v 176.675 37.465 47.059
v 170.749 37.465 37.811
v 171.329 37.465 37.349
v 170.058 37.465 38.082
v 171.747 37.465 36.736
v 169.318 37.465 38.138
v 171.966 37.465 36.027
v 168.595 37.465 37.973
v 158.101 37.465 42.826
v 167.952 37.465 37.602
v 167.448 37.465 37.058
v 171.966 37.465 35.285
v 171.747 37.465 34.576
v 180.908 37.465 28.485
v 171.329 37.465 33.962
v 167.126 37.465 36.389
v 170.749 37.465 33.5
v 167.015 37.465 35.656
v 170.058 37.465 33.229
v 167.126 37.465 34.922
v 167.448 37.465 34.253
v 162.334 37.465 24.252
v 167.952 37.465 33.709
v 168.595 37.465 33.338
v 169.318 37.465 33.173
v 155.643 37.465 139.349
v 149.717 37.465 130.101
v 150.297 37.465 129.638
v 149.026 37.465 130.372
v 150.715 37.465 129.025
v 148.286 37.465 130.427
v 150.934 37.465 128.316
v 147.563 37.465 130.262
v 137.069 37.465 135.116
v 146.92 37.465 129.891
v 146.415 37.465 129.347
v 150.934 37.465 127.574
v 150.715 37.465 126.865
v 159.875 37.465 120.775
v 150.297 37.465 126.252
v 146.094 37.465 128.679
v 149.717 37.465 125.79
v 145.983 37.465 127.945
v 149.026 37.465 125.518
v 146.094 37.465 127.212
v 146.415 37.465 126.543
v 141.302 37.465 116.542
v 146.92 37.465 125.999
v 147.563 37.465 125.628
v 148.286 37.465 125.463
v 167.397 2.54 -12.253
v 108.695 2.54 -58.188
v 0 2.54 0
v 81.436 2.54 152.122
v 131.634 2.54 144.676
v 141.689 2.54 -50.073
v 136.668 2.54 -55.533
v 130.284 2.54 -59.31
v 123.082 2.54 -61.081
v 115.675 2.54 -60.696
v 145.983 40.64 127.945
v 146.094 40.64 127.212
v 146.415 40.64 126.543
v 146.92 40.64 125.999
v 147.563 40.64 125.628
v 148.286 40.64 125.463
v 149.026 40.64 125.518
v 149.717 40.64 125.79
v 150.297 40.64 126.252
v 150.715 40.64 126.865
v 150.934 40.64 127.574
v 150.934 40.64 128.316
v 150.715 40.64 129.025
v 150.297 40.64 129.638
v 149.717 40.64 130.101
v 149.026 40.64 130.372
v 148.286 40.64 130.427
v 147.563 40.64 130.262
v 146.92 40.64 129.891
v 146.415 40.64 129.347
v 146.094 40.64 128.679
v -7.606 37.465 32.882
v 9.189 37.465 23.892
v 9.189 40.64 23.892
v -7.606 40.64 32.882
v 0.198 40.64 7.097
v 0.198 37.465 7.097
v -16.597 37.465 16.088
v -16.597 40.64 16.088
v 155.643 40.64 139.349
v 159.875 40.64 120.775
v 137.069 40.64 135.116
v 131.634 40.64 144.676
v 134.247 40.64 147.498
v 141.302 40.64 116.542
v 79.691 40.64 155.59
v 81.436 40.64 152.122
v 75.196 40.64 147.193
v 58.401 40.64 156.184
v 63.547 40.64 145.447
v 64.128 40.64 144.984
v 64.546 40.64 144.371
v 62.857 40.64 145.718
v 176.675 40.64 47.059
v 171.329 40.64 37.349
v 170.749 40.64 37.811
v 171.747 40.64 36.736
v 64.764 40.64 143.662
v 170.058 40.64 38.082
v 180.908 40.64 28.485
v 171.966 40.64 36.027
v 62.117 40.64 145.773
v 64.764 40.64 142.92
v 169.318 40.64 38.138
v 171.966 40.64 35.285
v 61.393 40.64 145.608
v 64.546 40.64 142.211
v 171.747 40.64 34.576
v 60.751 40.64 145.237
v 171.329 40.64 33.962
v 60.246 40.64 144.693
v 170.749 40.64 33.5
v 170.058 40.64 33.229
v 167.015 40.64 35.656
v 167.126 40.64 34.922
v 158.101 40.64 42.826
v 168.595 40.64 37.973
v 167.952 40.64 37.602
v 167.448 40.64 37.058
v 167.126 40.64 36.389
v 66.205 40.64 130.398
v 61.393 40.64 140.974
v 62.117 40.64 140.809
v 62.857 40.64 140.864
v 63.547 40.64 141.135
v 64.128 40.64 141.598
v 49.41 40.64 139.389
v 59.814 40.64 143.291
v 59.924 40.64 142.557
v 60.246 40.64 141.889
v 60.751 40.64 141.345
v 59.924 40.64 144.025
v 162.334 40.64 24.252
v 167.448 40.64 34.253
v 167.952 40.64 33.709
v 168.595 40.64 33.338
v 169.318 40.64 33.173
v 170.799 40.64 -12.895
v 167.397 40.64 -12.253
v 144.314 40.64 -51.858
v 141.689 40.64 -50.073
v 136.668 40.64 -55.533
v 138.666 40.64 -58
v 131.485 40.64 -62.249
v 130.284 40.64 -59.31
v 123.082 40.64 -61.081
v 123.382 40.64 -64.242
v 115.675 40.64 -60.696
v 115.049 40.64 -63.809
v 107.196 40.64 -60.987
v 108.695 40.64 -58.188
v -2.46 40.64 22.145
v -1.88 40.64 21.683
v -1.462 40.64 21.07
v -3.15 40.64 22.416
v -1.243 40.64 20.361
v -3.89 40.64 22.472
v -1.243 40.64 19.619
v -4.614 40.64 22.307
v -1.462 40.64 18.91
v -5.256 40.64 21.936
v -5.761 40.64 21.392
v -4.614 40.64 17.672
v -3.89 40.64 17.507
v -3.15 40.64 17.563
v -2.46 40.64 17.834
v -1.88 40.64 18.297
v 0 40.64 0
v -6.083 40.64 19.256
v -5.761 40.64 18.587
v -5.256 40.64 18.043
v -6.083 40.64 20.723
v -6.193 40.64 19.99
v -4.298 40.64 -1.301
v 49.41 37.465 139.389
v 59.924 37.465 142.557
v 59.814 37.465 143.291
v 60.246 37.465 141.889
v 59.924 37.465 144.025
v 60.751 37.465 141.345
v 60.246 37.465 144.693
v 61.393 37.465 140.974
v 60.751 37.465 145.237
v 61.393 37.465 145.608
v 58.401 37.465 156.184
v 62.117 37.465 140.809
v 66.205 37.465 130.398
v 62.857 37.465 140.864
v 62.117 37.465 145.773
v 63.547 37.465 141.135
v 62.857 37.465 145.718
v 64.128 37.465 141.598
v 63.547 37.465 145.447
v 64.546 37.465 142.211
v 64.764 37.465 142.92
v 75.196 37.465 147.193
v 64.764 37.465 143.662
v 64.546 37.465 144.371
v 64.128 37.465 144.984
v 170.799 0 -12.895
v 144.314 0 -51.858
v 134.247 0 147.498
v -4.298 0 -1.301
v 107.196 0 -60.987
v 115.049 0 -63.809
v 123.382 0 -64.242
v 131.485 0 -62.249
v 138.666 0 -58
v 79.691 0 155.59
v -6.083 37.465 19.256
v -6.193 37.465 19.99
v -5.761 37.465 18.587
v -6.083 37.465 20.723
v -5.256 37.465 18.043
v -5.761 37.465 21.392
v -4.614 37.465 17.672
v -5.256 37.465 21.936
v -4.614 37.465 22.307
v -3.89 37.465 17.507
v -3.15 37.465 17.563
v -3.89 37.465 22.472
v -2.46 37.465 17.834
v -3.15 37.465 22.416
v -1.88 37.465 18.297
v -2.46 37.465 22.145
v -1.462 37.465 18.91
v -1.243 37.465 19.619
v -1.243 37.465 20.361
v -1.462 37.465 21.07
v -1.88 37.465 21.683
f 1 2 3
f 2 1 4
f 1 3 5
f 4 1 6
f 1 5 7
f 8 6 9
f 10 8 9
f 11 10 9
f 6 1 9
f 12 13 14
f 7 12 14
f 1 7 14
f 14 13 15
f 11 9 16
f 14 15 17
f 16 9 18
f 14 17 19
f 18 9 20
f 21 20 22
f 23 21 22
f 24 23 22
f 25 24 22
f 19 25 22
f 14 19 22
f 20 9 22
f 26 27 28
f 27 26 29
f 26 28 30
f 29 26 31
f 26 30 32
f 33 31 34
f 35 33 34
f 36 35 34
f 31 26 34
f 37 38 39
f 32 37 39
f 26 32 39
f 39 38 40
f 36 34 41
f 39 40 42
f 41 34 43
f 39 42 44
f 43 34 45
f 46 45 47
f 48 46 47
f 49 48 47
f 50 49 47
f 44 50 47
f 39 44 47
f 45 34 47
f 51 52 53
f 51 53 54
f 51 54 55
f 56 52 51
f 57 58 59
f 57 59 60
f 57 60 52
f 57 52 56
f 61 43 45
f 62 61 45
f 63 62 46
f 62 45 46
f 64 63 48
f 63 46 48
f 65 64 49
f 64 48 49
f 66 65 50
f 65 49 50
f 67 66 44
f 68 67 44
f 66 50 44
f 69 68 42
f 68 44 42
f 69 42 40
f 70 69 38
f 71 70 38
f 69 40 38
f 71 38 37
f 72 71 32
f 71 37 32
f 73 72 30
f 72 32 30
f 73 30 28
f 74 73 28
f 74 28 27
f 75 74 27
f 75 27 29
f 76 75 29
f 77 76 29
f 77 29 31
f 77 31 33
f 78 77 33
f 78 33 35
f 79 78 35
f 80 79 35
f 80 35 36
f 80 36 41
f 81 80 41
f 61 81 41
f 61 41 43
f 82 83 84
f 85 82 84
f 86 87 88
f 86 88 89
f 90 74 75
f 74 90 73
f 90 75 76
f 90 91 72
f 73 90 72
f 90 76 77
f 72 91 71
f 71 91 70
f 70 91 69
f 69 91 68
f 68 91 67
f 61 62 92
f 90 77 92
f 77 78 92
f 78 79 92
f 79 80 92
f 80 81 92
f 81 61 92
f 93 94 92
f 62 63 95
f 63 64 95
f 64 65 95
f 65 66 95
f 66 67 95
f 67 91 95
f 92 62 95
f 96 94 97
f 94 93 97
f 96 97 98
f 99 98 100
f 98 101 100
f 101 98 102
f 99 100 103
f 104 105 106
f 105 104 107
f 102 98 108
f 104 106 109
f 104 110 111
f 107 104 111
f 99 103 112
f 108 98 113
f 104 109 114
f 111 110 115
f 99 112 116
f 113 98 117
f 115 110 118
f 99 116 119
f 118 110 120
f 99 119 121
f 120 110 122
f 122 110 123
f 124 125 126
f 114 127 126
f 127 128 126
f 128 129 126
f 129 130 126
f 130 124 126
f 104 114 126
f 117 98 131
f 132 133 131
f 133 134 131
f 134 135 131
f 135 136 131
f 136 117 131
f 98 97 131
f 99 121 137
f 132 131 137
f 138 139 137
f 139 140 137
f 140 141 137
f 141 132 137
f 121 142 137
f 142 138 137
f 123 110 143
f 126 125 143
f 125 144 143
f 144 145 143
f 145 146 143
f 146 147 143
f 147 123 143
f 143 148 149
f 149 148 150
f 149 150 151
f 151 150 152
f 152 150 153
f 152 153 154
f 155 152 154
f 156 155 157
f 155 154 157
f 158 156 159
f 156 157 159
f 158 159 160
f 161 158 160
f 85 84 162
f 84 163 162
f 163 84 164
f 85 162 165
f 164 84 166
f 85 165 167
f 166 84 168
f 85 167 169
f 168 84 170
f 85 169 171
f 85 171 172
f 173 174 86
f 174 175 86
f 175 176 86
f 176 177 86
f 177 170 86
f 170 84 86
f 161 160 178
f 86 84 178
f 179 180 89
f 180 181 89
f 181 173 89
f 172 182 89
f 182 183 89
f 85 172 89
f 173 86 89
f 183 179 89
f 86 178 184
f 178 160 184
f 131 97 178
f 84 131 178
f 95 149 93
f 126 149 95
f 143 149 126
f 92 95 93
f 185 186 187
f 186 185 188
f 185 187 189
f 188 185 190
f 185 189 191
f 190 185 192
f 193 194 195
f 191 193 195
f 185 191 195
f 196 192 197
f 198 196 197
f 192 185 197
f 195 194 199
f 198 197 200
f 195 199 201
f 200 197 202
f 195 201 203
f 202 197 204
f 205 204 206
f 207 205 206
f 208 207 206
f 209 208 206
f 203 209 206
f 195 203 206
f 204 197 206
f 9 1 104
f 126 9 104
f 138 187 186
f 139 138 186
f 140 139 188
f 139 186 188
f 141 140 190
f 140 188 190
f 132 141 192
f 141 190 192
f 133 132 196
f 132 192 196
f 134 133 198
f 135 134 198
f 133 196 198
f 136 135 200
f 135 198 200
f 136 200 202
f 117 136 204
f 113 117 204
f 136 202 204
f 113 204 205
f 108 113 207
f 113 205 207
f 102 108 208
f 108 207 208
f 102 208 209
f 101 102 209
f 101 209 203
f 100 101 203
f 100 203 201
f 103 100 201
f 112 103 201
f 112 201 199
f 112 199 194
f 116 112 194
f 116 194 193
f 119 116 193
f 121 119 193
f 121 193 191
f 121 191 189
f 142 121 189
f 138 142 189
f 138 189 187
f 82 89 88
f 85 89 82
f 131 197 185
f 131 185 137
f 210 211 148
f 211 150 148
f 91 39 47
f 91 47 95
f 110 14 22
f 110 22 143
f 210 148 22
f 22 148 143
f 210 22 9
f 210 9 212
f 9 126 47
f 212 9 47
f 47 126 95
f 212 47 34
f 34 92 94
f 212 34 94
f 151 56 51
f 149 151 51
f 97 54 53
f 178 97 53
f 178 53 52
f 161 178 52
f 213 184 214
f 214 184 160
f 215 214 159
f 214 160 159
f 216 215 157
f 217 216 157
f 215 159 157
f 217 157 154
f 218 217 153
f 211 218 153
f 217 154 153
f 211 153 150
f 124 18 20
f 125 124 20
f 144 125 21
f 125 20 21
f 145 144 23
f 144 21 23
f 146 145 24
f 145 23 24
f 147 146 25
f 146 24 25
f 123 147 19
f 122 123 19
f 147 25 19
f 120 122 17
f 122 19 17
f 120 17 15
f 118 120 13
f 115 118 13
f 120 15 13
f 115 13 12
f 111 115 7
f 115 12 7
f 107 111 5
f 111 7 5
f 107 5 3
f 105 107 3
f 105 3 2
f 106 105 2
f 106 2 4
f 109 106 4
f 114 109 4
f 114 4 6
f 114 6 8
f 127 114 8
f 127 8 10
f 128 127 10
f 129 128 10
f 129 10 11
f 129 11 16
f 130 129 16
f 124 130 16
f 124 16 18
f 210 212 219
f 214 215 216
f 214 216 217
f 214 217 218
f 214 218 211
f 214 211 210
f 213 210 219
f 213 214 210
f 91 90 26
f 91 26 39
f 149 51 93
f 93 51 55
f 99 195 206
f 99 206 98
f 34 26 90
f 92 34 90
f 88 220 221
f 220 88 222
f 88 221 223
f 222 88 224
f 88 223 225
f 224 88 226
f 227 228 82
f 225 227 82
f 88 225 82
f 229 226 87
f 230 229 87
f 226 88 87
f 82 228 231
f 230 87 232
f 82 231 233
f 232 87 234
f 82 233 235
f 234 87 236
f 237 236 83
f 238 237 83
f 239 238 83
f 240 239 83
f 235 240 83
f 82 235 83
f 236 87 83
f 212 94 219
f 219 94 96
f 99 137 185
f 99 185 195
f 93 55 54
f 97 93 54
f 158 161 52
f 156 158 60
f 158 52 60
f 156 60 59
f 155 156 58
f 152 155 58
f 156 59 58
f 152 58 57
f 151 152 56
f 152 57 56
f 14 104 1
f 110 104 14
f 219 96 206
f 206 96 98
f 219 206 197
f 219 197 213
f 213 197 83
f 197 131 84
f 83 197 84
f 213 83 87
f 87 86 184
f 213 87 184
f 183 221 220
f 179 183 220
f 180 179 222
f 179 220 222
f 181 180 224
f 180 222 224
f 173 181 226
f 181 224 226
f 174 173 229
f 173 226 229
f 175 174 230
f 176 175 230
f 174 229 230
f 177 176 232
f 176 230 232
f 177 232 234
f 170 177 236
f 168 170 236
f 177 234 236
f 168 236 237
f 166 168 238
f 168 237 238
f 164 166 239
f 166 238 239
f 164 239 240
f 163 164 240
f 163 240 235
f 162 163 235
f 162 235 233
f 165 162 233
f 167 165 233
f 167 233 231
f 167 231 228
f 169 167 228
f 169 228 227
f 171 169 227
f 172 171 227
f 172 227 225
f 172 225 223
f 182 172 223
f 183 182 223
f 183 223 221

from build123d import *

# Parameters (mm, degrees)
BOSS_EXTRUDE1_DEPTH      = 2.54
BOSS_EXTRUDE5_DEPTH      = 38.1
BOSS_EXTRUDE5_DEPTH_BACK = 2.54
SKETCH6_W                = 19.05
SKETCH6_H                = 3.175
BOSS_EXTRUDE6_DEPTH      = 19.05
SKETCH7_W                = 19.05
SKETCH7_H                = 3.175
BOSS_EXTRUDE7_DEPTH      = 19.05
CUT_EXTRUDE2_REACH       = 5.175
SKETCH8_R                = 2.4892


with BuildPart() as part:
    # Sketch1 → Boss-Extrude1 (new body)
    with BuildSketch(Plane(origin=(0, 0, 0), x_dir=(1, 0, 0), z_dir=(0, 1, 0))):
        with BuildLine():
            Line((108.694500094, 58.18760289), (0, 0))
            Line((0, 0), (81.435616874, -152.121813345))
            Line((81.435616874, -152.121813345), (131.633654365, -144.676094857))
            Line((131.633654365, -144.676094857), (167.396796738, 12.253350144))
            Line((167.396796738, 12.253350144), (141.688668345, 50.073487268))
            ThreePointArc((141.688668345, 50.073487268), (126.748044303, 60.459528823), (108.694500094, 58.18760289))
        make_face()
    extrude(amount=BOSS_EXTRUDE1_DEPTH)

    # Sketch2 → Boss-Extrude5 (add, two sides)
    with BuildSketch(Plane(origin=(0, 2.54, 0), x_dir=(1, 0, 0), z_dir=(0, 1, 0))) as boss_extrude5_sk:
        with BuildLine():
            Line((79.691089457, -155.590310016), (-4.297615284, 1.300674006))
            Line((-4.297615284, 1.300674006), (107.196029455, 60.986747535))
            ThreePointArc((107.196029455, 60.986747535), (127.50626669, 63.54266421), (144.314468737, 51.85836746))
            Line((144.314468737, 51.85836746), (170.799497483, 12.895304744))
            Line((170.799497483, 12.895304744), (134.24691646, -147.498214188))
            Line((134.24691646, -147.498214188), (79.691089457, -155.590310016))
        make_face()
        with BuildLine():
            Line((81.435616874, -152.121813345), (0, 0))
            Line((0, 0), (108.694500094, 58.18760289))
            ThreePointArc((108.694500094, 58.18760289), (126.748044303, 60.459528823), (141.688668345, 50.073487268))
            Line((141.688668345, 50.073487268), (167.396796738, 12.253350144))
            Line((167.396796738, 12.253350144), (131.633654365, -144.676094857))
            Line((131.633654365, -144.676094857), (81.435616874, -152.121813345))
        make_face(mode=Mode.SUBTRACT)
    extrude(amount=BOSS_EXTRUDE5_DEPTH)
    extrude(boss_extrude5_sk.sketch, amount=-BOSS_EXTRUDE5_DEPTH_BACK)

    # Sketch6 → Boss-Extrude6 (add)
    with BuildSketch(Plane(origin=(159.573264194, 0, 36.365650604), x_dir=(0.222196249, 0, -0.975001963), z_dir=(0.975001963, 0, 0.222196249))):
        with Locations((2.898955068, 39.0525)):
            Rectangle(SKETCH6_W, SKETCH6_H)
        with Locations((-91.756887063, 39.0525)):
            Rectangle(SKETCH6_W, SKETCH6_H)
    extrude(amount=BOSS_EXTRUDE6_DEPTH)

    # Sketch7 → Boss-Extrude7 (add)
    with BuildSketch(Plane(origin=(-2.799144645, 0, 1.498470639), x_dir=(0.471959256, 0, 0.881620361), z_dir=(-0.881620361, 0, 0.471959256))):
        with Locations((15.875, 39.0525)):
            Rectangle(SKETCH7_W, SKETCH7_H)
        with Locations((155.73253255, 39.0525)):
            Rectangle(SKETCH7_W, SKETCH7_H)
    extrude(amount=BOSS_EXTRUDE7_DEPTH)

    # Sketch8 → Cut-Extrude2 (cut, up to next)
    with BuildSketch(Plane(origin=(0, 37.465, 0), x_dir=(-1, 0, 0), z_dir=(0, -1, 0)), mode=Mode.PRIVATE) as cut_extrude2_sk1:
        with Locations((3.704225384, -19.989605782)):
            Circle(SKETCH8_R)
    cut_extrude2_tool1 = extrude(cut_extrude2_sk1.sketch, amount=-CUT_EXTRUDE2_REACH, mode=Mode.PRIVATE) & part.part
    add(cut_extrude2_tool1.solids().sort_by_distance((-3.704225, 37.465, 19.989606))[0], mode=Mode.SUBTRACT)
    # Sketch8 → Cut-Extrude2 (cut, up to next)
    with BuildSketch(Plane(origin=(0, 37.465, 0), x_dir=(-1, 0, 0), z_dir=(0, -1, 0)), mode=Mode.PRIVATE) as cut_extrude2_sk2:
        with Locations((-62.302831686, -143.290854064)):
            Circle(SKETCH8_R)
    cut_extrude2_tool2 = extrude(cut_extrude2_sk2.sketch, amount=-CUT_EXTRUDE2_REACH, mode=Mode.PRIVATE) & part.part
    add(cut_extrude2_tool2.solids().sort_by_distance((62.302832, 37.465, 143.290854))[0], mode=Mode.SUBTRACT)
    # Sketch8 → Cut-Extrude2 (cut, up to next)
    with BuildSketch(Plane(origin=(0, 37.465, 0), x_dir=(-1, 0, 0), z_dir=(0, -1, 0)), mode=Mode.PRIVATE) as cut_extrude2_sk3:
        with Locations((-148.472121782, -127.945214839)):
            Circle(SKETCH8_R)
    cut_extrude2_tool3 = extrude(cut_extrude2_sk3.sketch, amount=-CUT_EXTRUDE2_REACH, mode=Mode.PRIVATE) & part.part
    add(cut_extrude2_tool3.solids().sort_by_distance((148.472122, 37.465, 127.945215))[0], mode=Mode.SUBTRACT)
    # Sketch8 → Cut-Extrude2 (cut, up to next)
    with BuildSketch(Plane(origin=(0, 37.465, 0), x_dir=(-1, 0, 0), z_dir=(0, -1, 0)), mode=Mode.PRIVATE) as cut_extrude2_sk4:
        with Locations((-169.504294829, -35.655582993)):
            Circle(SKETCH8_R)
    cut_extrude2_tool4 = extrude(cut_extrude2_sk4.sketch, amount=-CUT_EXTRUDE2_REACH, mode=Mode.PRIVATE) & part.part
    add(cut_extrude2_tool4.solids().sort_by_distance((169.504295, 37.465, 35.655583))[0], mode=Mode.SUBTRACT)


solid = part.part
